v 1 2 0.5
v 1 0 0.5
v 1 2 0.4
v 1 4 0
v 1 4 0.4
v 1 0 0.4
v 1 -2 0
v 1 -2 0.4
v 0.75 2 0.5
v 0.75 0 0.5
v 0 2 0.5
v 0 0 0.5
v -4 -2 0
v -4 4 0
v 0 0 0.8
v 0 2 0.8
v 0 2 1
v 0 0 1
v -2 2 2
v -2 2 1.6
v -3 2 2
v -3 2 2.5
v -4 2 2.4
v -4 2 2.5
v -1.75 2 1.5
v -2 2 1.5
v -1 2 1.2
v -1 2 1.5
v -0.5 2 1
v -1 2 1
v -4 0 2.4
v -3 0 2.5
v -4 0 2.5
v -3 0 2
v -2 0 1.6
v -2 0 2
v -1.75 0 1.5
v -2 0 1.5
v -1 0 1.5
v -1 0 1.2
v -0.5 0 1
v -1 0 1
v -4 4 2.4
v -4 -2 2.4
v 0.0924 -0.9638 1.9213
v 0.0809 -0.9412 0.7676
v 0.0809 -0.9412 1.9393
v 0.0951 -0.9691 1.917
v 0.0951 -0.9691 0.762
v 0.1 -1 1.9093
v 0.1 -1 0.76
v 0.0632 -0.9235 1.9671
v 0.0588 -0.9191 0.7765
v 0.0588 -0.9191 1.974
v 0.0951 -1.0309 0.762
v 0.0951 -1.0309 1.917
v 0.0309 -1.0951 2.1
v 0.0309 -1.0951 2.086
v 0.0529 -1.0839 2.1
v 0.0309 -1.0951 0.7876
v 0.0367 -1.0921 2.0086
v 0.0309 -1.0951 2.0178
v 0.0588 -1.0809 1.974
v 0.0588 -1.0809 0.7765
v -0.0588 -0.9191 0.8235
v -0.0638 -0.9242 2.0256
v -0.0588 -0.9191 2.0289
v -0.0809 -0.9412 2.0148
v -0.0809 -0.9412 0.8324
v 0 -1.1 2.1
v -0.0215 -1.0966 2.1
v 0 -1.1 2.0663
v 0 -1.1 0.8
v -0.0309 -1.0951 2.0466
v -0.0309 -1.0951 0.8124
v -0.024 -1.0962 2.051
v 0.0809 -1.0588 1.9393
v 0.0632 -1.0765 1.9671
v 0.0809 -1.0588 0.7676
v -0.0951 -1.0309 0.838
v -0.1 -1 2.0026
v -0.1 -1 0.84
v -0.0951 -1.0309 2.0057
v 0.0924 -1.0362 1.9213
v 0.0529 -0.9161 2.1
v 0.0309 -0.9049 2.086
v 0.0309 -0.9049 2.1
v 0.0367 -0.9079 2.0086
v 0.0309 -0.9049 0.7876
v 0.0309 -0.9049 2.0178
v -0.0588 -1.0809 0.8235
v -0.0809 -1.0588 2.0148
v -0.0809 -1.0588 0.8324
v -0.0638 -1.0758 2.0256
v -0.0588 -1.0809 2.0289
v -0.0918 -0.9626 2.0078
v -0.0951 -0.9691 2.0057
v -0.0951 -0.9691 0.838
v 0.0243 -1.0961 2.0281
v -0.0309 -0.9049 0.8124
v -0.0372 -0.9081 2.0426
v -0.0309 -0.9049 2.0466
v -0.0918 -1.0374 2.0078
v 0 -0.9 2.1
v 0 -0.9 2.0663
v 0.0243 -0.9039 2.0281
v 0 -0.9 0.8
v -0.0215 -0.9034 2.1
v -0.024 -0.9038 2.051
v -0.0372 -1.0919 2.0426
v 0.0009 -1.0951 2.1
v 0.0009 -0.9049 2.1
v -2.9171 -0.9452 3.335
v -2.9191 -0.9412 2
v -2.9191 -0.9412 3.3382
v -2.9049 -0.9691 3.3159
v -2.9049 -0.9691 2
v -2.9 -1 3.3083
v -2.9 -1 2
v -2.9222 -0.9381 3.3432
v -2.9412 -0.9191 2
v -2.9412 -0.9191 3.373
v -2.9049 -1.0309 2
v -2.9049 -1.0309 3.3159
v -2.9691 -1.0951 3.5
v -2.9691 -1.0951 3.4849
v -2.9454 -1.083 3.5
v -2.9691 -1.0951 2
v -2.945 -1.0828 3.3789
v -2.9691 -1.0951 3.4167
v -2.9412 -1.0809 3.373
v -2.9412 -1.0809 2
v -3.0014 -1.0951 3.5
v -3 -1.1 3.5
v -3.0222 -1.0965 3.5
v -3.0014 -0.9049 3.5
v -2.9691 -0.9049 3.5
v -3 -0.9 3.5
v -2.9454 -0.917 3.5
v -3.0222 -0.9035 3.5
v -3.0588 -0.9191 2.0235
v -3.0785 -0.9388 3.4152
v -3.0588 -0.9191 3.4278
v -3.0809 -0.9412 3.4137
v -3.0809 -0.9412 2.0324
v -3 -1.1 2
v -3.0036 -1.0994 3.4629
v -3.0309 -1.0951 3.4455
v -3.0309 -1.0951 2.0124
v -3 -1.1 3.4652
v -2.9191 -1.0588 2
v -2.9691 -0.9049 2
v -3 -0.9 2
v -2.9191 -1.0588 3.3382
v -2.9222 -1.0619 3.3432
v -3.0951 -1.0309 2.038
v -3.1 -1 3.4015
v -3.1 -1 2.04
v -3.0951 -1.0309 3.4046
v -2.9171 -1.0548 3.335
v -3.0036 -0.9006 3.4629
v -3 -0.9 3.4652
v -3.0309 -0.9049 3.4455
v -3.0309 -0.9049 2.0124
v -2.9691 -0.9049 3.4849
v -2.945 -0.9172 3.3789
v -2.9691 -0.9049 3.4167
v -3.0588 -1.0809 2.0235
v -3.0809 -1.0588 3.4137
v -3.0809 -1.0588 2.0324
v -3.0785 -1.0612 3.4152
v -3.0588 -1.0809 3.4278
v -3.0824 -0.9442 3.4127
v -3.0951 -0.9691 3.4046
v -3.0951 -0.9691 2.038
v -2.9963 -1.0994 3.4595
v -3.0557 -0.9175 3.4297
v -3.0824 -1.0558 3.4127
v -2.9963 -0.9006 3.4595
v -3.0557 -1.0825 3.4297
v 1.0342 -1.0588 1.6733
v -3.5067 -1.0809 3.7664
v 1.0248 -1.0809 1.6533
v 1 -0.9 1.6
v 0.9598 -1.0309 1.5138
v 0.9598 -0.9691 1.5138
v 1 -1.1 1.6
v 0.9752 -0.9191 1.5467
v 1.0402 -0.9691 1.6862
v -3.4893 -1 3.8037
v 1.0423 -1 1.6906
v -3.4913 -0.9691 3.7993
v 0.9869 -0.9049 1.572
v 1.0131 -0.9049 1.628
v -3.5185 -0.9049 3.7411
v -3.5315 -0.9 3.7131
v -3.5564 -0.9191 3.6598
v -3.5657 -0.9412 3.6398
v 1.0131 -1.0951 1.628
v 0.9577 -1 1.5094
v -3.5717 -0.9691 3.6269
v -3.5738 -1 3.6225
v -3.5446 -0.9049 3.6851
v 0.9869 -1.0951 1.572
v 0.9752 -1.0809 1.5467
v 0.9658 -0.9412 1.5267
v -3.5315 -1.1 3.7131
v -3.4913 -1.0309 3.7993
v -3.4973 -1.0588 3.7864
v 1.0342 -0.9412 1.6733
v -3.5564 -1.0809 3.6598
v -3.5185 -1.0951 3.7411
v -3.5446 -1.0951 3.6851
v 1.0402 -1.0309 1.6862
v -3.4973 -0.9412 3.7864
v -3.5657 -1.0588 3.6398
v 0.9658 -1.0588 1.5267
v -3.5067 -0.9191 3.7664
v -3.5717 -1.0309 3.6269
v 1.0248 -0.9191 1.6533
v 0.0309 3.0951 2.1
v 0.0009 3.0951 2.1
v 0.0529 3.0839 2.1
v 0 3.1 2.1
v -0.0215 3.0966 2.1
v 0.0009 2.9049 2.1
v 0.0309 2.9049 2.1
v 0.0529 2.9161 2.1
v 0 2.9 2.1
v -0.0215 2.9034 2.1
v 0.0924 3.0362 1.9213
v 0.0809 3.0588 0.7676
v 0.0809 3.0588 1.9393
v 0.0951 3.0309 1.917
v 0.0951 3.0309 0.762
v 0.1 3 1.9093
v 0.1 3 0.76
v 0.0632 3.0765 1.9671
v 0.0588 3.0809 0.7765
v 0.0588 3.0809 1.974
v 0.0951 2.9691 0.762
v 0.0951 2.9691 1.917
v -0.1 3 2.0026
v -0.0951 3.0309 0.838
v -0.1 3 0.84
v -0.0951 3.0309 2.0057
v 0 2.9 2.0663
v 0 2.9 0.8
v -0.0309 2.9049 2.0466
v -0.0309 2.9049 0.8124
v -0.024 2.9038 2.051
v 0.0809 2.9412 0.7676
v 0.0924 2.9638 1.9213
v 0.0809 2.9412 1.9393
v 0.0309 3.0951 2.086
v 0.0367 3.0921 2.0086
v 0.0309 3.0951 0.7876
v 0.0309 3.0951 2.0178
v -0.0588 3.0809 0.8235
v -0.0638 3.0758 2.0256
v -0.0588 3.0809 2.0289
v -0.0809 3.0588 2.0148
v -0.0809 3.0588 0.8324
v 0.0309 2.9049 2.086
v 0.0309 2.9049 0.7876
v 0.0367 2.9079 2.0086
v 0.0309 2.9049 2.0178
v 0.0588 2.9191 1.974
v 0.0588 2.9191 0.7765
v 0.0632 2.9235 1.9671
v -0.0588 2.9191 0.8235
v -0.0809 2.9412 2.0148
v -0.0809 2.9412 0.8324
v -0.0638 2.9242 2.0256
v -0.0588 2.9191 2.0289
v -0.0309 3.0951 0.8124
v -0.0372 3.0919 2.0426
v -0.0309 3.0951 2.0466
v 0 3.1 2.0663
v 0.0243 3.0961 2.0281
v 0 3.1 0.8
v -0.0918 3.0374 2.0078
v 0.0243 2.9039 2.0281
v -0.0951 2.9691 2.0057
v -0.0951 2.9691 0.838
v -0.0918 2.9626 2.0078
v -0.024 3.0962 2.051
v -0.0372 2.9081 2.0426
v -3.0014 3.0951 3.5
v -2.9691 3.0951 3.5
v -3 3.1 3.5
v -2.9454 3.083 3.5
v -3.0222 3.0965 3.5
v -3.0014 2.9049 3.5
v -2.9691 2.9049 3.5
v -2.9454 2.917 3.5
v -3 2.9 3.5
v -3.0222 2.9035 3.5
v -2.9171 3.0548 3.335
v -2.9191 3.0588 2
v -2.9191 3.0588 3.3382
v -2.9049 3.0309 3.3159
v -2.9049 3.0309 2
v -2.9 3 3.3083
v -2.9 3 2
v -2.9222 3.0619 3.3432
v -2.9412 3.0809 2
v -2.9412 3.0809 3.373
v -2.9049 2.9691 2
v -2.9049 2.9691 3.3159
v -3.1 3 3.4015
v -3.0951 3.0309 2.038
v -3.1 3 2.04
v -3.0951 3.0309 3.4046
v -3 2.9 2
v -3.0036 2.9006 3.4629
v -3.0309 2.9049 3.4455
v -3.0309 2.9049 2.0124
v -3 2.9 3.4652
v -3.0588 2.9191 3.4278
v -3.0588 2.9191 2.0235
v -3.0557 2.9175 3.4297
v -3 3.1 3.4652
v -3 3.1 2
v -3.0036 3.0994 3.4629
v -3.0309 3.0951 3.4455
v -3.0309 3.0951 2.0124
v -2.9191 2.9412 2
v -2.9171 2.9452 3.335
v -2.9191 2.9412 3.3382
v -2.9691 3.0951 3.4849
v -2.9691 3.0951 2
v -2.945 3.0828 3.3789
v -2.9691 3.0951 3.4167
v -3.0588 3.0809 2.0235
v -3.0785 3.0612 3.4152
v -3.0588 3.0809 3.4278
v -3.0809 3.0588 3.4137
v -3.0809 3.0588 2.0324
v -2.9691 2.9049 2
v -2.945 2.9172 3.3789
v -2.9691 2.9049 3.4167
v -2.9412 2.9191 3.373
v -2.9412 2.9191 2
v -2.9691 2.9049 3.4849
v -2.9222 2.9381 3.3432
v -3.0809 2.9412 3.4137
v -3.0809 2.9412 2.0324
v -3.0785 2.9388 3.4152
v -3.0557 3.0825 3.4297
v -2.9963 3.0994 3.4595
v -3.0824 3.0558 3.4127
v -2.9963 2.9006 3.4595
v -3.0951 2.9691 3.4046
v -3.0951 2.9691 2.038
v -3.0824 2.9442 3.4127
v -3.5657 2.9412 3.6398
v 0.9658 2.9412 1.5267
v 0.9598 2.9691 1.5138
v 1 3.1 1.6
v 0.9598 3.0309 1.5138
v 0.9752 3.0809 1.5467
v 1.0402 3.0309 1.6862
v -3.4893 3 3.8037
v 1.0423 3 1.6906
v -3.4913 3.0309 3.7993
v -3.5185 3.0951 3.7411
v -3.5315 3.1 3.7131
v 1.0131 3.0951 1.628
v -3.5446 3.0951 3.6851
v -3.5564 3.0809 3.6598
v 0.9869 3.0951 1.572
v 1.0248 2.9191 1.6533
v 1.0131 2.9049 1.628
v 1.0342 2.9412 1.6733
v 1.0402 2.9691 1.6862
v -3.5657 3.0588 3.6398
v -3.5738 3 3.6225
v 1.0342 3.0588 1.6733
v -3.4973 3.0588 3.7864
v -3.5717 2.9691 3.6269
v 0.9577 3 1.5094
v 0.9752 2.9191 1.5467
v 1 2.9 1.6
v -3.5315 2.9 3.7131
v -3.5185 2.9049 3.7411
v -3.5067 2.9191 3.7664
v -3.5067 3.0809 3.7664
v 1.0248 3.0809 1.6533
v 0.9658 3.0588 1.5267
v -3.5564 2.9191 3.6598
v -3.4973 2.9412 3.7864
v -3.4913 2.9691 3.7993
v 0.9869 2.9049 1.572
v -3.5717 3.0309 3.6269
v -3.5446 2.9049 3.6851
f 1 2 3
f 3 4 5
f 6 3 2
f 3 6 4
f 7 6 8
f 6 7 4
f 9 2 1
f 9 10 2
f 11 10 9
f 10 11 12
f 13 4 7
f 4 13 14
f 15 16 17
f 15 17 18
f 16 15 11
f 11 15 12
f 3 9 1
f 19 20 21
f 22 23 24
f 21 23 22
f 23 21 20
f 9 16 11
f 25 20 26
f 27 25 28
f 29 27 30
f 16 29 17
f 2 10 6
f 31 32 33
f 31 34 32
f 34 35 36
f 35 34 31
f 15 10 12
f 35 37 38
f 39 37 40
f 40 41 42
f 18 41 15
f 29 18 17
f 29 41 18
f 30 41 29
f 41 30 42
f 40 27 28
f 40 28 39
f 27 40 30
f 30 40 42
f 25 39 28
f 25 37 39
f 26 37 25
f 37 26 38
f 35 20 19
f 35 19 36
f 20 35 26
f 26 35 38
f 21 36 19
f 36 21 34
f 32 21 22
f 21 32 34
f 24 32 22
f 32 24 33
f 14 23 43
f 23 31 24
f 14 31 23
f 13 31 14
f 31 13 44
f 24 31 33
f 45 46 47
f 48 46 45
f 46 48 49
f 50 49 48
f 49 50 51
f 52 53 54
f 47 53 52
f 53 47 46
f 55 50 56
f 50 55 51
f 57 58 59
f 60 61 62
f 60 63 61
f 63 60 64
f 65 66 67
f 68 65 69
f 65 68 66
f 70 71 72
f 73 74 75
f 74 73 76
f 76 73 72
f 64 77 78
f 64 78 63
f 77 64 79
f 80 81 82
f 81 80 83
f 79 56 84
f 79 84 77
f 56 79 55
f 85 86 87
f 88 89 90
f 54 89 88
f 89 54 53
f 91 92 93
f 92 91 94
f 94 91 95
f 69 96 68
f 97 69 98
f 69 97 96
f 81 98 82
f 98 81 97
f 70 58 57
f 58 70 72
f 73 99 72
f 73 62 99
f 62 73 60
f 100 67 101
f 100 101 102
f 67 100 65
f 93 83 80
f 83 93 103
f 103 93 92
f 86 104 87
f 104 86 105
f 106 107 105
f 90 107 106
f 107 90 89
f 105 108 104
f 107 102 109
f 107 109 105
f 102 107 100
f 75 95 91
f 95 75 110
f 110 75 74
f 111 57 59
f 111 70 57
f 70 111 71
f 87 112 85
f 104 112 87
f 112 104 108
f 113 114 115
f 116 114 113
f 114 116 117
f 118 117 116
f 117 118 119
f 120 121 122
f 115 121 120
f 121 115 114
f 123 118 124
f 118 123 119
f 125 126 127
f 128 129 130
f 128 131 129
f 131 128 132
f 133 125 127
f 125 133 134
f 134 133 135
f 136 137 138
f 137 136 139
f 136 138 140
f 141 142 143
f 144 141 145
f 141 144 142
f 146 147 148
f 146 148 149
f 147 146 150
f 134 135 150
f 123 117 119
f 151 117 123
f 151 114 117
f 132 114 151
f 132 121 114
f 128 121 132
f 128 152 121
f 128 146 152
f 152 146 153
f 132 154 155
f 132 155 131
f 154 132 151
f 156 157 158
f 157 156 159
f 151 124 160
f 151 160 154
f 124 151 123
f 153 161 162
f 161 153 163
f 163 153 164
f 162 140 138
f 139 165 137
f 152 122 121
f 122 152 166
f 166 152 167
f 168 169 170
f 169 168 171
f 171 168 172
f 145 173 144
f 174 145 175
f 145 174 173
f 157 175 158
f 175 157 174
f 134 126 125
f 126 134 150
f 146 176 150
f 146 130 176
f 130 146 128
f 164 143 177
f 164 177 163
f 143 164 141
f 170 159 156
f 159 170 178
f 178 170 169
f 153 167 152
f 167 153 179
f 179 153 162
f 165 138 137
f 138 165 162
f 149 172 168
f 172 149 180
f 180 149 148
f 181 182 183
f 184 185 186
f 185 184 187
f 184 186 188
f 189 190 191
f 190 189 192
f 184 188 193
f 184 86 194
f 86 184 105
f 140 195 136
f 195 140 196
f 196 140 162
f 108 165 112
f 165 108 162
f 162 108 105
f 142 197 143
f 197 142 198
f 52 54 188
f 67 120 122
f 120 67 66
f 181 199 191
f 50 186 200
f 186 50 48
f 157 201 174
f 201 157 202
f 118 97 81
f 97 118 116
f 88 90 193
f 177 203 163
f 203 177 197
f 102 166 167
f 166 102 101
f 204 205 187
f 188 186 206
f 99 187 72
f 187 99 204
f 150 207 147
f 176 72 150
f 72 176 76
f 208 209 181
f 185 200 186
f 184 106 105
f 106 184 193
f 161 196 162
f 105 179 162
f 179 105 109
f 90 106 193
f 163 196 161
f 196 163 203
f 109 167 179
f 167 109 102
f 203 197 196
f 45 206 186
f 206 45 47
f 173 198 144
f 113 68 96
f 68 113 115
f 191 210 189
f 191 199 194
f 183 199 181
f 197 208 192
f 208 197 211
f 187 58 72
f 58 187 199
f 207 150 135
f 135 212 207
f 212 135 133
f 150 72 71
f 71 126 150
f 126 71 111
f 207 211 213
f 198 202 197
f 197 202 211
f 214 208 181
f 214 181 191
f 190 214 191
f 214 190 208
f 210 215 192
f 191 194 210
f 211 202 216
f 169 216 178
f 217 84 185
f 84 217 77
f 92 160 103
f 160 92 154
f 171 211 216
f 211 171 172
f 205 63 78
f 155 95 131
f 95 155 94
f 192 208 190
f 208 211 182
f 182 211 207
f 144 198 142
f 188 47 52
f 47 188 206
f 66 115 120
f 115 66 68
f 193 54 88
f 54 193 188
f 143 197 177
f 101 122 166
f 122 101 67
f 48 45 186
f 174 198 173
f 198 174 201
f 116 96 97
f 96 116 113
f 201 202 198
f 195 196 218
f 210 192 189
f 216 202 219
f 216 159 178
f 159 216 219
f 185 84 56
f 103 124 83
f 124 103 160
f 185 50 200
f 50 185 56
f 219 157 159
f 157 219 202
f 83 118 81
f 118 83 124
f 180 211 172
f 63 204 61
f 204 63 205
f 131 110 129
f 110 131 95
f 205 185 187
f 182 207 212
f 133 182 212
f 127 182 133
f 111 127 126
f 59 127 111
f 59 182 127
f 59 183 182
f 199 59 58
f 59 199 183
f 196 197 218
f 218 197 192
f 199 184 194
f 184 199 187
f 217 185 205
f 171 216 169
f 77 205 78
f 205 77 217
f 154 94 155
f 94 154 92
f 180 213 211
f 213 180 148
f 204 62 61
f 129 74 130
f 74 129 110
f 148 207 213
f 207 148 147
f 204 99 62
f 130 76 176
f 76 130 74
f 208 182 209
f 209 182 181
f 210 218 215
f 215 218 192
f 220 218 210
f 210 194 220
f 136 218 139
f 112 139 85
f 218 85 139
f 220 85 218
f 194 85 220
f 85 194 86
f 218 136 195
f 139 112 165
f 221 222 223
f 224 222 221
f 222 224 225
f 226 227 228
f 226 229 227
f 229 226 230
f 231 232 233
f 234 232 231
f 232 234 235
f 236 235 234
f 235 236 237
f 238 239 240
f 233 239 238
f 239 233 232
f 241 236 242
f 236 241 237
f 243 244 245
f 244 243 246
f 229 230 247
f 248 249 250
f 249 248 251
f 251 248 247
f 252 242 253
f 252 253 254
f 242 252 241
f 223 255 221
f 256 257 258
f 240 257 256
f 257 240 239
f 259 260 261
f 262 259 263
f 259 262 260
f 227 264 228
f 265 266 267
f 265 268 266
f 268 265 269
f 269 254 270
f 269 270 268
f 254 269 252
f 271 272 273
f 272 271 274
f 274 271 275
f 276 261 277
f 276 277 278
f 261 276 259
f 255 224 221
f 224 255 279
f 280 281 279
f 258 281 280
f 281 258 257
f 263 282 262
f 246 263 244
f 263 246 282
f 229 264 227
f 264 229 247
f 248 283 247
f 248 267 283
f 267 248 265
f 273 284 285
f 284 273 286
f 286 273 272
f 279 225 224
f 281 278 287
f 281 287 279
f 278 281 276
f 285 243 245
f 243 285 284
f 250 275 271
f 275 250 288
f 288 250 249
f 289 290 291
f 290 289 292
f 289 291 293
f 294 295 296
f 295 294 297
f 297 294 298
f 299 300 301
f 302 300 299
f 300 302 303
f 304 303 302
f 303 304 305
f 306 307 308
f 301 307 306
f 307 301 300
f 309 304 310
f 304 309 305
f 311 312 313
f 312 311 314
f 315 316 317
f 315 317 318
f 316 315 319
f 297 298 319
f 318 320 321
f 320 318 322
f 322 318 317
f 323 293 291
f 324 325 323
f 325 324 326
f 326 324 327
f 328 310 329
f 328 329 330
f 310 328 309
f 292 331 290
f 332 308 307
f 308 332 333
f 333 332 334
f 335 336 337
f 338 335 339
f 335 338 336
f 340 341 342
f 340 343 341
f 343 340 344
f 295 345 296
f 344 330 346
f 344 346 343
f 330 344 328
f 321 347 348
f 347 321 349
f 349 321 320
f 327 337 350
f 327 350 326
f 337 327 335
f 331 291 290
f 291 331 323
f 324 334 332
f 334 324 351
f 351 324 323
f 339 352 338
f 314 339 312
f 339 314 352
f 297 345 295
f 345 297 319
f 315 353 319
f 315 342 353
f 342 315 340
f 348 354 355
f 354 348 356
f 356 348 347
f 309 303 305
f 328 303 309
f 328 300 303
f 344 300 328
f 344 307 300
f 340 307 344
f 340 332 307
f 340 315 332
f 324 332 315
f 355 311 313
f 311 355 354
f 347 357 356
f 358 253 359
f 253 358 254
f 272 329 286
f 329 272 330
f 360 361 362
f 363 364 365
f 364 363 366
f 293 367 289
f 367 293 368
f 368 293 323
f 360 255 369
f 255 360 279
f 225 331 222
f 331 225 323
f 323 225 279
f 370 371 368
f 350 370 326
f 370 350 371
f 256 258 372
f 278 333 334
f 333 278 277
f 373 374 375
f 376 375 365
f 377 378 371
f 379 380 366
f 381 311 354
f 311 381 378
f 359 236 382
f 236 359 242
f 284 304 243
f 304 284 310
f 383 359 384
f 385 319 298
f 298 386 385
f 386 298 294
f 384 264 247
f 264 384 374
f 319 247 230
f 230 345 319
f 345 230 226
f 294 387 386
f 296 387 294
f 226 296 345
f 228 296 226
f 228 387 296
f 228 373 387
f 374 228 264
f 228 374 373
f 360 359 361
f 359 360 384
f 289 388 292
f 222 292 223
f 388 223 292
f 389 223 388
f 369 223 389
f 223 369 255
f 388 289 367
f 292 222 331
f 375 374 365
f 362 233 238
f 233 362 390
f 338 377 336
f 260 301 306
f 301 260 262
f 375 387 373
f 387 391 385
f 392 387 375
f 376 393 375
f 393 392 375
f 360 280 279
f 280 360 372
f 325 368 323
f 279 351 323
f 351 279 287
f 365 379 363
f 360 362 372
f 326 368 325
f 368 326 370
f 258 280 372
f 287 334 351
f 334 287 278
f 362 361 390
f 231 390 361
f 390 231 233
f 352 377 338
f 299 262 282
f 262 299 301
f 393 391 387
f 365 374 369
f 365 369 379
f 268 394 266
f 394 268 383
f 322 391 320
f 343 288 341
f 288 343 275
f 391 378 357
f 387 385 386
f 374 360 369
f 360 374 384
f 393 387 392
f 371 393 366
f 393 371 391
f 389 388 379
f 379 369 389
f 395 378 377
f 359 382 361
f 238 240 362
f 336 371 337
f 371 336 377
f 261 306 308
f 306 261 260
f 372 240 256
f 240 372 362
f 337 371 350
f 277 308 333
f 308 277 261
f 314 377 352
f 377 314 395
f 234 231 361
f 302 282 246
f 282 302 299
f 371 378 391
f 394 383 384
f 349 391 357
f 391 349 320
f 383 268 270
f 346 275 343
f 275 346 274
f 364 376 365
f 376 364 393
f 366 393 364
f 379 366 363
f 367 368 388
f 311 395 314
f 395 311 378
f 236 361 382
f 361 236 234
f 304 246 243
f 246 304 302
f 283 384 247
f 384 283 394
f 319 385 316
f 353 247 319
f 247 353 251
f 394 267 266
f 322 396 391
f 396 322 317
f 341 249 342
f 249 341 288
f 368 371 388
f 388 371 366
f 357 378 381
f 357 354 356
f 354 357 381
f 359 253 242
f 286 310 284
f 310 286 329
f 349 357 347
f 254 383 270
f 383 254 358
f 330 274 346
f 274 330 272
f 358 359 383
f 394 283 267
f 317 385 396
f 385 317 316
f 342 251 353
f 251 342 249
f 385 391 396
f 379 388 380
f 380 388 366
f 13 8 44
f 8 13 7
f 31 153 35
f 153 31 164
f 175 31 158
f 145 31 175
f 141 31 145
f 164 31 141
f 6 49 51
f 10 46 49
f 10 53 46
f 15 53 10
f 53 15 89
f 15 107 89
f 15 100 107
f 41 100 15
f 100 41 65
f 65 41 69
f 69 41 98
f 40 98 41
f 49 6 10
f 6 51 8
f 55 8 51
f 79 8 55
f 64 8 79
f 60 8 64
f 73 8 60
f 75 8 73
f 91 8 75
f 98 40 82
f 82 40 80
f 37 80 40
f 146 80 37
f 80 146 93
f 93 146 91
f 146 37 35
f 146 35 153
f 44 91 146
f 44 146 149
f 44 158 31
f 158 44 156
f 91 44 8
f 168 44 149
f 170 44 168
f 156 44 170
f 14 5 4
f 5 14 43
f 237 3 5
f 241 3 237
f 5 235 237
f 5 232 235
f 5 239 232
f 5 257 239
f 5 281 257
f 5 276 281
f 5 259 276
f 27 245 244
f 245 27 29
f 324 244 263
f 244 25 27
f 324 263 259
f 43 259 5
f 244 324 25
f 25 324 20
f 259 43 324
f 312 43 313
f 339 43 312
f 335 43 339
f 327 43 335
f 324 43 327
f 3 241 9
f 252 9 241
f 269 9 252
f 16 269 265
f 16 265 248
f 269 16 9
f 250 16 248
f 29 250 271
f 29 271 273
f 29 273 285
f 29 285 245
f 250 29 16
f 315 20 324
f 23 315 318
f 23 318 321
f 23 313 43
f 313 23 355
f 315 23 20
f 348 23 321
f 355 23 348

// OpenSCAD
module Stairs_01(){

    color("#cdaa7d"){
    
    translate([0,-0,0])
    cube([1,2,0.5]);

    translate([-1,-0,0])
    cube([1,2,1]);

    translate([-2,-0,0])
    cube([1,2,1.5]);

    translate([-3,-0,0])
    cube([1,2,2]);

    translate([-4,-0,0])
    cube([1,2,2.5]);
    }
    
    color("gray")
    translate([-1.5,-1,0.2])
    cube([5,2,0.4], center = true);
    
    
    rotate([90,0,180])
    color("gray")
    translate([-1,0.4,-2])
    linear_extrude(2)
    polygon(points=[[0,0],[5,2],[5,0]]); 
    
     
    color("gray")
    translate([-1.5,3,0.2])
    cube([5,2,0.4], center = true);
  
    rotate([90,0,180])
    color("gray")
    translate([-1,0.4,2])
    linear_extrude(2)
    polygon(points=[[0,0],[5,2],[5,0]]); 
    
    color("DarkSlateGray"){
    translate([0,-1,0.6])
    cylinder(1.5,0.1,0.1, $fn =20);
    
    translate([-3,-1,2])
    cylinder(1.5,0.1,0.1, $fn =20);
    
    translate([1,-1,1.6])
    rotate([0,-65,0])
    cylinder(5,0.1,0.1, $fn =20);
    }
    
    color("DarkSlateGray"){
    translate([0,3,0.6])
    cylinder(1.5,0.1,0.1, $fn =20);
    
    translate([-3,3,2])
    cylinder(1.5,0.1,0.1, $fn =20);
    
    translate([1,3,1.6])
    rotate([0,-65,0])
    cylinder(5,0.1,0.1, $fn =20);
    }
    
}

Stairs_01();

// Written by Nicolì Angelo (Gengio) 2024: 
// MIT License

//Permission is hereby granted, free of charge, to any person obtaining a copy of this software and associated documentation files (the "Software"), to deal in the Software without restriction, including without limitation the rights to use, copy, modify, merge, publish, distribute, sublicense, and/or sell copies of the Software, and to permit persons to whom the Software is furnished to do so, subject to the following conditions:

//The above copyright notice and this permission notice shall be included in all copies or substantial portions of the Software.

//THE SOFTWARE IS PROVIDED "AS IS", WITHOUT WARRANTY OF ANY KIND, EXPRESS OR IMPLIED, INCLUDING BUT NOT LIMITED TO THE WARRANTIES OF MERCHANTABILITY, FITNESS FOR A PARTICULAR PURPOSE AND NONINFRINGEMENT. IN NO EVENT SHALL THE AUTHORS OR COPYRIGHT HOLDERS BE LIABLE FOR ANY CLAIM, DAMAGES OR OTHER LIABILITY, WHETHER IN AN ACTION OF CONTRACT, TORT OR OTHERWISE, ARISING FROM, OUT OF OR IN CONNECTION WITH THE SOFTWARE OR THE USE OR OTHER DEALINGS IN THE SOFTWARE.
